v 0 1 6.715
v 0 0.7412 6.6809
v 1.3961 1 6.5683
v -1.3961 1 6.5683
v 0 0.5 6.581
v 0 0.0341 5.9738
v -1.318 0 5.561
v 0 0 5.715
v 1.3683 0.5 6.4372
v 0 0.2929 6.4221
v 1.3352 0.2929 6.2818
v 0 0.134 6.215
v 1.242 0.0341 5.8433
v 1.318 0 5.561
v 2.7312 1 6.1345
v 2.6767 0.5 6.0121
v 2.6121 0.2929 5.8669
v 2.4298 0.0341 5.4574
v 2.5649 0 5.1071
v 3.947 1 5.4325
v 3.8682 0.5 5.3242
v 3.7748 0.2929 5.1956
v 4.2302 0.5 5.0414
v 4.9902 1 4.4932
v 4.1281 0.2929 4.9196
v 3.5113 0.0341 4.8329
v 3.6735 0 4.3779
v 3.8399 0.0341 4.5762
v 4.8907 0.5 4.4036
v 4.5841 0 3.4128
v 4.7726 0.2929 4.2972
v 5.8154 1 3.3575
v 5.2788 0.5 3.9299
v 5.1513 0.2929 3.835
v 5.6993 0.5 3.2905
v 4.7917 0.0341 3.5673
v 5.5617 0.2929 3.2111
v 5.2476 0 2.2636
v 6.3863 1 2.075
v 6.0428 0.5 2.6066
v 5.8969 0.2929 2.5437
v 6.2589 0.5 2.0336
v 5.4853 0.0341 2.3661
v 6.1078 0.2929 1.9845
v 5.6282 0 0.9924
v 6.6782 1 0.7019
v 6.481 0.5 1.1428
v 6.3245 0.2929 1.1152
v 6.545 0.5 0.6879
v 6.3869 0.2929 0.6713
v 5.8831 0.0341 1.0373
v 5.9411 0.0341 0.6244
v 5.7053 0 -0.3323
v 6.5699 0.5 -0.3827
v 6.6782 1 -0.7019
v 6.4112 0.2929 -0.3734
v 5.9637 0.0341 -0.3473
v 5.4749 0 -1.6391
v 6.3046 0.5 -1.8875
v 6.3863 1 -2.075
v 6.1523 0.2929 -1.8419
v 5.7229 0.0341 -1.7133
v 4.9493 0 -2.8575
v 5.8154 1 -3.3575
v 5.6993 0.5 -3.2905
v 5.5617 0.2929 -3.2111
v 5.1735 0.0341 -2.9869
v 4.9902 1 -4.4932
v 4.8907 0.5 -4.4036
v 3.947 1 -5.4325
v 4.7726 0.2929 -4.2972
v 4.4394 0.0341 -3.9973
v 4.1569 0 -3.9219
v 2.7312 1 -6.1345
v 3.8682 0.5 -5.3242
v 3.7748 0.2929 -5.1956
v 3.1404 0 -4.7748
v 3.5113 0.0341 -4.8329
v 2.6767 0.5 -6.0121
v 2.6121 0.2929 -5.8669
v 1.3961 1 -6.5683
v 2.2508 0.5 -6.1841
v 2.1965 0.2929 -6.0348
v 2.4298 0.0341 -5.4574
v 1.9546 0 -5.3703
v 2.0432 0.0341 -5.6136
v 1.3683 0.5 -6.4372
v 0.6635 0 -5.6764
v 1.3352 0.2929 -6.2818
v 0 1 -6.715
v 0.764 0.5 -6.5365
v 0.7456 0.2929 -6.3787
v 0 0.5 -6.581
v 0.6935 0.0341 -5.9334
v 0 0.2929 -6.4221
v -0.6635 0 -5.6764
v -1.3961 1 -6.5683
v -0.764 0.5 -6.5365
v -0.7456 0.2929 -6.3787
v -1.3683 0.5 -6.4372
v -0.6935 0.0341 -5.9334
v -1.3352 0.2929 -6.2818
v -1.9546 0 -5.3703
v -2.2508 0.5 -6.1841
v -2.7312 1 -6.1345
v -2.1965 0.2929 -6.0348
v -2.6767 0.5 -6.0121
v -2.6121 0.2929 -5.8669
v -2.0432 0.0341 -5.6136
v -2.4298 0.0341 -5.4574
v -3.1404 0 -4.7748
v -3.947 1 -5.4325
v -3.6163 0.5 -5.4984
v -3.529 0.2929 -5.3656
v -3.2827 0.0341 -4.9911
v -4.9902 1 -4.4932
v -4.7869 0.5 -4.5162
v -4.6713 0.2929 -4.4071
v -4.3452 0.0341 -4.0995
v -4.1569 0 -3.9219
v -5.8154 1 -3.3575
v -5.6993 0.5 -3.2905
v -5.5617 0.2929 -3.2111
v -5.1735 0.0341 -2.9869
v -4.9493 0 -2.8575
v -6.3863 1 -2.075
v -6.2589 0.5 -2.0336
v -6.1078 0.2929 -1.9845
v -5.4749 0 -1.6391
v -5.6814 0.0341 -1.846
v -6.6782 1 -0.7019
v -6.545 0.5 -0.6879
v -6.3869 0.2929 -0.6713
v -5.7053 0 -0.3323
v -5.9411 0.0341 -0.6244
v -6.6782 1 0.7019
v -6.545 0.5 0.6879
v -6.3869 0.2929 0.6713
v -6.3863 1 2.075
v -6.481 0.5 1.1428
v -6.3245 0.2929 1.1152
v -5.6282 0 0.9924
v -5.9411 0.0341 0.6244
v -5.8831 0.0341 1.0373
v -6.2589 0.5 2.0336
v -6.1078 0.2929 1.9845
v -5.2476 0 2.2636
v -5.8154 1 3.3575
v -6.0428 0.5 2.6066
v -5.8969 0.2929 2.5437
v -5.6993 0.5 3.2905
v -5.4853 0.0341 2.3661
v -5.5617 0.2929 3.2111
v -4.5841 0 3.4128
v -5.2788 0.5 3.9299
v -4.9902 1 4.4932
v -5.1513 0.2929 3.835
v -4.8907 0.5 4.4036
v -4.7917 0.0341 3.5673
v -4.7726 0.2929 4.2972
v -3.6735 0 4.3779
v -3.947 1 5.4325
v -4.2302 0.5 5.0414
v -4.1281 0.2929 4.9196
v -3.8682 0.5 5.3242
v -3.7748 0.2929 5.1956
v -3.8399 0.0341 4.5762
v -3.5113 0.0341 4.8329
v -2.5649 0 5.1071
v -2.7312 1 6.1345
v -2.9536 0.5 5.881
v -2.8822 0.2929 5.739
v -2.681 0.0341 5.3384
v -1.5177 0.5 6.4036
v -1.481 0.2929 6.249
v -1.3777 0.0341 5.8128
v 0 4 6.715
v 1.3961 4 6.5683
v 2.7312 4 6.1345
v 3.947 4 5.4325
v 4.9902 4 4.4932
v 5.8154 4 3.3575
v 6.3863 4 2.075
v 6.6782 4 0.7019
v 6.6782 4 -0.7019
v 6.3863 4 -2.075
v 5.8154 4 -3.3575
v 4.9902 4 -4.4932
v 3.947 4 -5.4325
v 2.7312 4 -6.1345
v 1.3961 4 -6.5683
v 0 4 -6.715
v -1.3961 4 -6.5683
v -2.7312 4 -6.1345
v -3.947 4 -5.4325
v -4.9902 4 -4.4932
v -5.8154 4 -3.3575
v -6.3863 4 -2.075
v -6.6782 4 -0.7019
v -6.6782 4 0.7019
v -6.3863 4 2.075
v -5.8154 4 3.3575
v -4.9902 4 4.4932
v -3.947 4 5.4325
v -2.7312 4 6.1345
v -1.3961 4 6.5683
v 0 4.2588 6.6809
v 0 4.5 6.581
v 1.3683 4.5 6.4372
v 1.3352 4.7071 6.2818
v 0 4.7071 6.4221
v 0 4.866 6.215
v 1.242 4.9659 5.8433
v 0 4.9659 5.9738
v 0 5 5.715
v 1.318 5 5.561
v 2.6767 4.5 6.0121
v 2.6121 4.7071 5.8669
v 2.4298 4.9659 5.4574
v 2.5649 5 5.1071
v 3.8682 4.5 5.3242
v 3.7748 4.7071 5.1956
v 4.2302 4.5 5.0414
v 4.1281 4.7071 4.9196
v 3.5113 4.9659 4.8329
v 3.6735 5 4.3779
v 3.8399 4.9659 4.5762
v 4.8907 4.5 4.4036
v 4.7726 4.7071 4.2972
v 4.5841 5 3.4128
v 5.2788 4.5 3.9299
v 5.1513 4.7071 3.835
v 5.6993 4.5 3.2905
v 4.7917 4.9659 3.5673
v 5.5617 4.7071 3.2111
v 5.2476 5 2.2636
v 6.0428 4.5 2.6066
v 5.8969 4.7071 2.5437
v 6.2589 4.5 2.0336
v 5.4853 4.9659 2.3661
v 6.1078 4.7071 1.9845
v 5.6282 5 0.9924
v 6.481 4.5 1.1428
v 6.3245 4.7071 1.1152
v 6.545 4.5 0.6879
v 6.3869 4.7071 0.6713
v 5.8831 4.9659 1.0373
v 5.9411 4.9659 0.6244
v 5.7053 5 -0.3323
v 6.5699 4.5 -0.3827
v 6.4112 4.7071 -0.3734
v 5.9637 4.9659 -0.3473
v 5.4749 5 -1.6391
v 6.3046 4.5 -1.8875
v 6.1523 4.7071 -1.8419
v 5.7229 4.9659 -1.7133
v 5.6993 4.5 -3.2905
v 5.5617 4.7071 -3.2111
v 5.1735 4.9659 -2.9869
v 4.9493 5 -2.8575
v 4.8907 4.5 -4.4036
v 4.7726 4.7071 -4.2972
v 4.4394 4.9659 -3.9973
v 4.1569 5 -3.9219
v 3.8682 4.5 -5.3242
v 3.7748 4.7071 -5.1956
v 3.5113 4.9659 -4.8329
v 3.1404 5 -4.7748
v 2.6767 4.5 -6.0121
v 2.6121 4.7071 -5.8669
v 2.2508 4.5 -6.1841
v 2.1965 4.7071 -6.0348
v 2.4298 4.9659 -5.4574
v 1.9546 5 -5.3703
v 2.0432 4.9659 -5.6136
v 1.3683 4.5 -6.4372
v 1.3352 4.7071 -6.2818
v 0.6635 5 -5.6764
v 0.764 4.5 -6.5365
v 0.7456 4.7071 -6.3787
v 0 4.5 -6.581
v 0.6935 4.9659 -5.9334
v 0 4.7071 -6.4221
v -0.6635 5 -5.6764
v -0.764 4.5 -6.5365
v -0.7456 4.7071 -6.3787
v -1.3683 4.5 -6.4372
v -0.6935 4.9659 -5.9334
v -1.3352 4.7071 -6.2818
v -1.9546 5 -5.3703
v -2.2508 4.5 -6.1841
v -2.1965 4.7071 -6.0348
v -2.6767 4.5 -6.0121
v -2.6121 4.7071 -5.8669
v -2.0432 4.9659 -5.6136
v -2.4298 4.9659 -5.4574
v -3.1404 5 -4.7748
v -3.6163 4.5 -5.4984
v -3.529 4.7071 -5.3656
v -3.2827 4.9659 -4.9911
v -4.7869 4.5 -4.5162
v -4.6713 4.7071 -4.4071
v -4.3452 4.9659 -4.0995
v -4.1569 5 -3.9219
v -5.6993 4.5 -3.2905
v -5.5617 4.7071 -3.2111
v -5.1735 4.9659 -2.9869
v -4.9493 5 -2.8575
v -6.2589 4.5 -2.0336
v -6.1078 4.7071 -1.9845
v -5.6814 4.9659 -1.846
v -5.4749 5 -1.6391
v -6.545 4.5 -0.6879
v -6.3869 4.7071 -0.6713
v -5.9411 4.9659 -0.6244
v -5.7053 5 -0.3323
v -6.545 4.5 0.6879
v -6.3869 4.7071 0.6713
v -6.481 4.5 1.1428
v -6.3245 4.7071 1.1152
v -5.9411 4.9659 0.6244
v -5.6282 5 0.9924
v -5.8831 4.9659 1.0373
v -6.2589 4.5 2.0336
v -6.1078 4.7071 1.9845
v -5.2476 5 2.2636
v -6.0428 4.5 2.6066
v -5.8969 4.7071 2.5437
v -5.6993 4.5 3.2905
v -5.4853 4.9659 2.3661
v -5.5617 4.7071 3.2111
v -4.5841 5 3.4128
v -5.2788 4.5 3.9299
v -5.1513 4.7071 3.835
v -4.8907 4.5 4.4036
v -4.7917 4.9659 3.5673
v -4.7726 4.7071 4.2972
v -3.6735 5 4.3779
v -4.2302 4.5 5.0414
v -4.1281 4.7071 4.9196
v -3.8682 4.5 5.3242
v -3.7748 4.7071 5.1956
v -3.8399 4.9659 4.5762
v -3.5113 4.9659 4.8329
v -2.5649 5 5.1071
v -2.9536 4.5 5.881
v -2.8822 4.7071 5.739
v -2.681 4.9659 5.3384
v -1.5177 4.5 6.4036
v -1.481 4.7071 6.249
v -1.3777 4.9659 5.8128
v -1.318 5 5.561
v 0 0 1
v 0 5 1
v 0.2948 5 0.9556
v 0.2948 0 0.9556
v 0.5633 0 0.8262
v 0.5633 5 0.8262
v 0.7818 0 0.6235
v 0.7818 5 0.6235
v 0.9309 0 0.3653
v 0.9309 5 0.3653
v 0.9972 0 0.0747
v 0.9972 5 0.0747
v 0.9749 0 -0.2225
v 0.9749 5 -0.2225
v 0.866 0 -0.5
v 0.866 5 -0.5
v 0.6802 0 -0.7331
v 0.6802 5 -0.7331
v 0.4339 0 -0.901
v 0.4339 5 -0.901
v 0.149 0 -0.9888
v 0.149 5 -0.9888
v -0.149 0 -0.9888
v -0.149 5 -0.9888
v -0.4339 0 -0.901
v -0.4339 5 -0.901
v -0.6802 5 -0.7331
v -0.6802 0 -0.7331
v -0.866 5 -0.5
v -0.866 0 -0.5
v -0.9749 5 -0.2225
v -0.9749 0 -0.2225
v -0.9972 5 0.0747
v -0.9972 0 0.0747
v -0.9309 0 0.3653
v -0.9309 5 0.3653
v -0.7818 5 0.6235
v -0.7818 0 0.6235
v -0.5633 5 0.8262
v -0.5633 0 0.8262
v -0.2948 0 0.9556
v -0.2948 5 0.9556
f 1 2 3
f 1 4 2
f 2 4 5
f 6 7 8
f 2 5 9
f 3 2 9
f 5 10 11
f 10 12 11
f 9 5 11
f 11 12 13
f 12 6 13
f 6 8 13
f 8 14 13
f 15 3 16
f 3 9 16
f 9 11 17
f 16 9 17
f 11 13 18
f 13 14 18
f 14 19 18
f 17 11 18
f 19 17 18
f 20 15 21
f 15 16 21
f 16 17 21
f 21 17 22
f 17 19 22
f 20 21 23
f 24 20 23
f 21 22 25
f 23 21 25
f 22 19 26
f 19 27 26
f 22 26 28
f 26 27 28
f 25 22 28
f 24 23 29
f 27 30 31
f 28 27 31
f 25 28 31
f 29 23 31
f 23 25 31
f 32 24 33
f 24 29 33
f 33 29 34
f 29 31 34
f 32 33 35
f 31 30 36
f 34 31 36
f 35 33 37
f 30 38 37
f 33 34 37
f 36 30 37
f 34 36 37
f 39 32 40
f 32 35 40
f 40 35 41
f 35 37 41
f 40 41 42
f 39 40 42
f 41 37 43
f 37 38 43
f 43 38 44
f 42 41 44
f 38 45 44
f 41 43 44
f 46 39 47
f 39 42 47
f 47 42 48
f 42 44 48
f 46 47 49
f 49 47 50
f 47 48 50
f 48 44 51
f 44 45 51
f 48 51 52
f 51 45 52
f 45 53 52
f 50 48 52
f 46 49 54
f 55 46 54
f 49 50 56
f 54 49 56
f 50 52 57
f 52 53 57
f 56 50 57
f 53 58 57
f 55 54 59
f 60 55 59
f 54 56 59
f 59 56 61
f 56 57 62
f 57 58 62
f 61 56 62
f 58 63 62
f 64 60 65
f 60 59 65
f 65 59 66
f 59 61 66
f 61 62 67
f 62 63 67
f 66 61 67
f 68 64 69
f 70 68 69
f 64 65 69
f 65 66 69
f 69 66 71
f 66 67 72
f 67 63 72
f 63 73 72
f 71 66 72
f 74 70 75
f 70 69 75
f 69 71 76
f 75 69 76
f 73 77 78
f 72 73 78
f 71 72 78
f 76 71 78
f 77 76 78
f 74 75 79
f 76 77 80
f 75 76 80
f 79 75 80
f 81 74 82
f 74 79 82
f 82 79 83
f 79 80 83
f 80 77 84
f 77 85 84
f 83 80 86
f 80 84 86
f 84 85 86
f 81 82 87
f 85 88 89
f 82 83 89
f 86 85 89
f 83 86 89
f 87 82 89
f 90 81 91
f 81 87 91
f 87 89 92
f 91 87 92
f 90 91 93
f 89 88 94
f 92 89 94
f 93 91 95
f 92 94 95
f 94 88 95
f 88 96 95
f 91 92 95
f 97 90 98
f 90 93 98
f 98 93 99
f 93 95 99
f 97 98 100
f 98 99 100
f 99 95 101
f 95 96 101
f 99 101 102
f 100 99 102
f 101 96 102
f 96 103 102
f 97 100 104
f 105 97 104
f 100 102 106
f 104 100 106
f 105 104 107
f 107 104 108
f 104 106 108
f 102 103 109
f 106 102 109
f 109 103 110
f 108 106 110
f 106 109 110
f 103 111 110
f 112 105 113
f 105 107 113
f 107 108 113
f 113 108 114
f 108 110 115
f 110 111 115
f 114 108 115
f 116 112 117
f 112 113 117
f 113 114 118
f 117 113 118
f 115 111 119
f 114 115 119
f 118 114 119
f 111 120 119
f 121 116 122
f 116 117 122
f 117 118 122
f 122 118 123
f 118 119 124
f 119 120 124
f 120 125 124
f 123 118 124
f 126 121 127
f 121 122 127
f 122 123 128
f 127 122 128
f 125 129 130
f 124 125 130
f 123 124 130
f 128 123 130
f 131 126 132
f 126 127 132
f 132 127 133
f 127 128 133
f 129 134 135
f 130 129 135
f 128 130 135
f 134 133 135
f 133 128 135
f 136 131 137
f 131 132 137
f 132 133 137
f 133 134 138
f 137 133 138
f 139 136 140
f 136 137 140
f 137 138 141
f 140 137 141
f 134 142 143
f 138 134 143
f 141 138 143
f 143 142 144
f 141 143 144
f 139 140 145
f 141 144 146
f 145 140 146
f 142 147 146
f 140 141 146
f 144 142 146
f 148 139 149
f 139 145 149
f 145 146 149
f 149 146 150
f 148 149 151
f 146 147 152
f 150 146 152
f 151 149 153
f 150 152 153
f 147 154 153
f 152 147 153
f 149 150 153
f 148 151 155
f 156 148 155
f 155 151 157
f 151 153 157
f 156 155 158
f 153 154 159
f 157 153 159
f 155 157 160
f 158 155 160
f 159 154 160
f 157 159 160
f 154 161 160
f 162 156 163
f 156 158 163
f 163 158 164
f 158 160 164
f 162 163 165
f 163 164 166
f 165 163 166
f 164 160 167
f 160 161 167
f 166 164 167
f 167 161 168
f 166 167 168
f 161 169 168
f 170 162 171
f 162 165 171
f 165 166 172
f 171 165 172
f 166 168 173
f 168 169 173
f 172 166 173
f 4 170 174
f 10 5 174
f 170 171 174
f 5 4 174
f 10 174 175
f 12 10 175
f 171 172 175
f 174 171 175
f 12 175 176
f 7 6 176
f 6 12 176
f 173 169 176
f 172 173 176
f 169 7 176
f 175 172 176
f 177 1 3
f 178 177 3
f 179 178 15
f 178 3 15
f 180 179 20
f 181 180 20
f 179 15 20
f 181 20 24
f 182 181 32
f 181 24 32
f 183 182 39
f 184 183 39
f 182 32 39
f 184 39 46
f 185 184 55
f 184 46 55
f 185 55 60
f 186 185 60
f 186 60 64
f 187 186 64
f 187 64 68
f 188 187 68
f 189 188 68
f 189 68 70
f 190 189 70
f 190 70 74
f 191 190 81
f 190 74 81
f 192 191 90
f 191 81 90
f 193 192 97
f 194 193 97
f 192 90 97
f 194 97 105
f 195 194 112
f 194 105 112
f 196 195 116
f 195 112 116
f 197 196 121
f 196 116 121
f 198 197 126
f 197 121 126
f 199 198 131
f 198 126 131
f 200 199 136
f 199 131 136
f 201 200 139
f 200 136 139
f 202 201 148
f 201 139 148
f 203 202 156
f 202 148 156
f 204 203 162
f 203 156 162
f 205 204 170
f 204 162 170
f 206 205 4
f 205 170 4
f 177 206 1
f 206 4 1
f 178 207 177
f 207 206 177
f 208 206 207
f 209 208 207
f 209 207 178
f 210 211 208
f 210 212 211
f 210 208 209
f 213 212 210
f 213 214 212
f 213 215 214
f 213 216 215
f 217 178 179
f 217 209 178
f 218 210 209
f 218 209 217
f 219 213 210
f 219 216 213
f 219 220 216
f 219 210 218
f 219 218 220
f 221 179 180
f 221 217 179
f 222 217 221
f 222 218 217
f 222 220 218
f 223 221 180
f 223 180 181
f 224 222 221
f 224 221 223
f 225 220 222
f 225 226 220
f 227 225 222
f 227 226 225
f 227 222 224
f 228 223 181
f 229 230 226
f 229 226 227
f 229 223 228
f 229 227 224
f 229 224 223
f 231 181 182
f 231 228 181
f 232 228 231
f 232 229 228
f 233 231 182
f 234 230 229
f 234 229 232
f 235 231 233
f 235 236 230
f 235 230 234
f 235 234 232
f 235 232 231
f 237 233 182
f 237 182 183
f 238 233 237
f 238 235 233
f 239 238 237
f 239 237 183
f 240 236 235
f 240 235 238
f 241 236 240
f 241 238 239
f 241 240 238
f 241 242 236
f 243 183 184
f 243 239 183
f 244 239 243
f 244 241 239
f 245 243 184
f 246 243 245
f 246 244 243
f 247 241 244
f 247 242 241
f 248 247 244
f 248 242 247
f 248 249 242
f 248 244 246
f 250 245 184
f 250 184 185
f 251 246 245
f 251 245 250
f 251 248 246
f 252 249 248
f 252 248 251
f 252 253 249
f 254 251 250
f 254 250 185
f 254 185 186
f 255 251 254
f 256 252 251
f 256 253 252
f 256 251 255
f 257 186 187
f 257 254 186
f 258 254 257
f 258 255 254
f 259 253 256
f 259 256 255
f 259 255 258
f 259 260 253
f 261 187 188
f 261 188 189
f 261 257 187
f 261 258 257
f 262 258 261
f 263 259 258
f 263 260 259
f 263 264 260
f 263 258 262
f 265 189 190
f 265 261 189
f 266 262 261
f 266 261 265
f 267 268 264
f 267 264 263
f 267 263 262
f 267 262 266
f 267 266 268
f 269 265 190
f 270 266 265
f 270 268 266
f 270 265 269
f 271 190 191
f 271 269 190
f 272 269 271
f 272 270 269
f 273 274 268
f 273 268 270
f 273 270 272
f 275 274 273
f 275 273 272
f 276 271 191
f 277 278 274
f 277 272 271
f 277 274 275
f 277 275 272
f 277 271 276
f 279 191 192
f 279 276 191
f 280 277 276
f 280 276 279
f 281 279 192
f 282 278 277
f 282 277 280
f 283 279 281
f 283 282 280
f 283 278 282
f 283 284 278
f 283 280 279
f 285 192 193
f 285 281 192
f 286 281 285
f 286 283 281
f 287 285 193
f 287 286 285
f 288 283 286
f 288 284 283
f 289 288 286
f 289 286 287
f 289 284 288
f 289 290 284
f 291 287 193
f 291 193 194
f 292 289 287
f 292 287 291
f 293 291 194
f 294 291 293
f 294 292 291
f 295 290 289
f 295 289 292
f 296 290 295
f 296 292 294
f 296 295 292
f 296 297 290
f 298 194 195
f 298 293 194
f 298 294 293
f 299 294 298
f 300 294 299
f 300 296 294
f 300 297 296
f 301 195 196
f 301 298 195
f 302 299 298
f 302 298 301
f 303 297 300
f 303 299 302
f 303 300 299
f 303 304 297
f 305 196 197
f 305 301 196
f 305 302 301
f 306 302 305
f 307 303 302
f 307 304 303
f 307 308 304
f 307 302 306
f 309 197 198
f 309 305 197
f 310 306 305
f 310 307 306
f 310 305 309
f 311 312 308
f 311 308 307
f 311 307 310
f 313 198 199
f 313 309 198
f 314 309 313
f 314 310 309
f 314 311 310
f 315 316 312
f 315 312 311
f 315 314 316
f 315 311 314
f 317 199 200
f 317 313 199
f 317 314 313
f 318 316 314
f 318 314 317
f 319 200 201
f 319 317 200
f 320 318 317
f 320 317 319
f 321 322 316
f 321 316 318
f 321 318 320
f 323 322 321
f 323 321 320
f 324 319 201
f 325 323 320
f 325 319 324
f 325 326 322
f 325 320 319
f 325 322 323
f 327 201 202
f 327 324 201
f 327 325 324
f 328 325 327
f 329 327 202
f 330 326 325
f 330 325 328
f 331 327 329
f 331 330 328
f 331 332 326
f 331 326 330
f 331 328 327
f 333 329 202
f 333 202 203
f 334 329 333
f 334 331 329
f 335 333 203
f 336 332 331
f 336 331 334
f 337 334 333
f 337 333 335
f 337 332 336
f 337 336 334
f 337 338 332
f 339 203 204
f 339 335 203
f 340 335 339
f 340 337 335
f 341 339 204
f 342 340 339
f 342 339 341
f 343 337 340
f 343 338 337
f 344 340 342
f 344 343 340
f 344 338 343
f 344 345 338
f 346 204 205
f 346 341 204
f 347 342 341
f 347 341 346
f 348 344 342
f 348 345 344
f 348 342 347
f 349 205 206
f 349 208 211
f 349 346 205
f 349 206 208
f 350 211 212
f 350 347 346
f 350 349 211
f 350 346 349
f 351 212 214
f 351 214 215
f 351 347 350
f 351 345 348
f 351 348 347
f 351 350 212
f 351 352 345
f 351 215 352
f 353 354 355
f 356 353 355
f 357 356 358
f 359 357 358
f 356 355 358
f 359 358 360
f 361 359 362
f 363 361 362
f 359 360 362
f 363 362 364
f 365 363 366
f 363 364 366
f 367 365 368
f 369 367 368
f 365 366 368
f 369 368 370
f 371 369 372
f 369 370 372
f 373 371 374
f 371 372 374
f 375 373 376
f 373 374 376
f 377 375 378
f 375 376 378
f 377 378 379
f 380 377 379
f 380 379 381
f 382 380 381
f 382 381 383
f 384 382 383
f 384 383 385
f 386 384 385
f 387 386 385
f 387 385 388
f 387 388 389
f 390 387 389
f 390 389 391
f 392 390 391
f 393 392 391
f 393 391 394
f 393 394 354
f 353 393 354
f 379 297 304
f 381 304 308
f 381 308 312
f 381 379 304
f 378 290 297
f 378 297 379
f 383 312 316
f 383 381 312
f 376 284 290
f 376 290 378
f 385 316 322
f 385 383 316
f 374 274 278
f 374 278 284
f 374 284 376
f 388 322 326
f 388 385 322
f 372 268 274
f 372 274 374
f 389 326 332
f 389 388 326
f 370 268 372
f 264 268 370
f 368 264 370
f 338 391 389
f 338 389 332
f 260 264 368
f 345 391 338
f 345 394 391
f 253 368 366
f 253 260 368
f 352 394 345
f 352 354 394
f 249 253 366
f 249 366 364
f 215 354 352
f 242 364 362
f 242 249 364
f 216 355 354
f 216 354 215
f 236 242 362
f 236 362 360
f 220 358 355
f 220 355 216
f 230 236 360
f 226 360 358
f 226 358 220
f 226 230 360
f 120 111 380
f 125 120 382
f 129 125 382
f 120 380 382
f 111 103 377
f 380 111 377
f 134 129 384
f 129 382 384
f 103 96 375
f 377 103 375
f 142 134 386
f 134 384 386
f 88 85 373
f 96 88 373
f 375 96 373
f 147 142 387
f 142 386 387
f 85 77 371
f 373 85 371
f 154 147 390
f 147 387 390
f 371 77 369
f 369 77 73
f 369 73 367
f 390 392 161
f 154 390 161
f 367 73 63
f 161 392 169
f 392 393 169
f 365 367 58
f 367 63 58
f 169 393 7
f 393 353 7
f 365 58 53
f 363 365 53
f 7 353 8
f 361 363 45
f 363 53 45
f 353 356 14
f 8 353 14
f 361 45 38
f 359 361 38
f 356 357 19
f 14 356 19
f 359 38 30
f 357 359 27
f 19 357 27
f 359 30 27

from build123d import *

# Parameters (mm, degrees)
SKETCH1_R           = 6.715
BOSS_EXTRUDE1_DEPTH = 5
FILLET1_R           = 1
CUT_EXTRUDE1_REACH  = 12.732
SKETCH2_R           = 1


with BuildPart() as part:
    # Sketch1 → Boss-Extrude1 (new body)
    with BuildSketch(Plane(origin=(0, 0, 0), x_dir=(1, 0, 0), z_dir=(0, 1, 0))):
        with Locations(Location((0, 0, 0), (0, 0, 270))):
            Circle(SKETCH1_R)
    extrude(amount=BOSS_EXTRUDE1_DEPTH)

    # Fillet1
    fillet1_edges = [part.edges().sort_by_distance(p)[0] for p in [
        (0, 0, -6.715),
        (0, 5, -6.715),
    ]]
    fillet(fillet1_edges, radius=FILLET1_R)

    # Sketch2 → Cut-Extrude1 (cut, up to next)
    with BuildSketch(Plane(origin=(0, 5, 0), x_dir=(1, 0, 0), z_dir=(0, 1, 0)), mode=Mode.PRIVATE) as cut_extrude1_sk1:
        with Locations(Location((0, 0, 0), (0, 0, 270))):
            Circle(SKETCH2_R)
    cut_extrude1_tool1 = extrude(cut_extrude1_sk1.sketch, amount=-CUT_EXTRUDE1_REACH, mode=Mode.PRIVATE) & part.part
    add(cut_extrude1_tool1.solids().sort_by_distance((0, 5, 0))[0], mode=Mode.SUBTRACT)


solid = part.part
